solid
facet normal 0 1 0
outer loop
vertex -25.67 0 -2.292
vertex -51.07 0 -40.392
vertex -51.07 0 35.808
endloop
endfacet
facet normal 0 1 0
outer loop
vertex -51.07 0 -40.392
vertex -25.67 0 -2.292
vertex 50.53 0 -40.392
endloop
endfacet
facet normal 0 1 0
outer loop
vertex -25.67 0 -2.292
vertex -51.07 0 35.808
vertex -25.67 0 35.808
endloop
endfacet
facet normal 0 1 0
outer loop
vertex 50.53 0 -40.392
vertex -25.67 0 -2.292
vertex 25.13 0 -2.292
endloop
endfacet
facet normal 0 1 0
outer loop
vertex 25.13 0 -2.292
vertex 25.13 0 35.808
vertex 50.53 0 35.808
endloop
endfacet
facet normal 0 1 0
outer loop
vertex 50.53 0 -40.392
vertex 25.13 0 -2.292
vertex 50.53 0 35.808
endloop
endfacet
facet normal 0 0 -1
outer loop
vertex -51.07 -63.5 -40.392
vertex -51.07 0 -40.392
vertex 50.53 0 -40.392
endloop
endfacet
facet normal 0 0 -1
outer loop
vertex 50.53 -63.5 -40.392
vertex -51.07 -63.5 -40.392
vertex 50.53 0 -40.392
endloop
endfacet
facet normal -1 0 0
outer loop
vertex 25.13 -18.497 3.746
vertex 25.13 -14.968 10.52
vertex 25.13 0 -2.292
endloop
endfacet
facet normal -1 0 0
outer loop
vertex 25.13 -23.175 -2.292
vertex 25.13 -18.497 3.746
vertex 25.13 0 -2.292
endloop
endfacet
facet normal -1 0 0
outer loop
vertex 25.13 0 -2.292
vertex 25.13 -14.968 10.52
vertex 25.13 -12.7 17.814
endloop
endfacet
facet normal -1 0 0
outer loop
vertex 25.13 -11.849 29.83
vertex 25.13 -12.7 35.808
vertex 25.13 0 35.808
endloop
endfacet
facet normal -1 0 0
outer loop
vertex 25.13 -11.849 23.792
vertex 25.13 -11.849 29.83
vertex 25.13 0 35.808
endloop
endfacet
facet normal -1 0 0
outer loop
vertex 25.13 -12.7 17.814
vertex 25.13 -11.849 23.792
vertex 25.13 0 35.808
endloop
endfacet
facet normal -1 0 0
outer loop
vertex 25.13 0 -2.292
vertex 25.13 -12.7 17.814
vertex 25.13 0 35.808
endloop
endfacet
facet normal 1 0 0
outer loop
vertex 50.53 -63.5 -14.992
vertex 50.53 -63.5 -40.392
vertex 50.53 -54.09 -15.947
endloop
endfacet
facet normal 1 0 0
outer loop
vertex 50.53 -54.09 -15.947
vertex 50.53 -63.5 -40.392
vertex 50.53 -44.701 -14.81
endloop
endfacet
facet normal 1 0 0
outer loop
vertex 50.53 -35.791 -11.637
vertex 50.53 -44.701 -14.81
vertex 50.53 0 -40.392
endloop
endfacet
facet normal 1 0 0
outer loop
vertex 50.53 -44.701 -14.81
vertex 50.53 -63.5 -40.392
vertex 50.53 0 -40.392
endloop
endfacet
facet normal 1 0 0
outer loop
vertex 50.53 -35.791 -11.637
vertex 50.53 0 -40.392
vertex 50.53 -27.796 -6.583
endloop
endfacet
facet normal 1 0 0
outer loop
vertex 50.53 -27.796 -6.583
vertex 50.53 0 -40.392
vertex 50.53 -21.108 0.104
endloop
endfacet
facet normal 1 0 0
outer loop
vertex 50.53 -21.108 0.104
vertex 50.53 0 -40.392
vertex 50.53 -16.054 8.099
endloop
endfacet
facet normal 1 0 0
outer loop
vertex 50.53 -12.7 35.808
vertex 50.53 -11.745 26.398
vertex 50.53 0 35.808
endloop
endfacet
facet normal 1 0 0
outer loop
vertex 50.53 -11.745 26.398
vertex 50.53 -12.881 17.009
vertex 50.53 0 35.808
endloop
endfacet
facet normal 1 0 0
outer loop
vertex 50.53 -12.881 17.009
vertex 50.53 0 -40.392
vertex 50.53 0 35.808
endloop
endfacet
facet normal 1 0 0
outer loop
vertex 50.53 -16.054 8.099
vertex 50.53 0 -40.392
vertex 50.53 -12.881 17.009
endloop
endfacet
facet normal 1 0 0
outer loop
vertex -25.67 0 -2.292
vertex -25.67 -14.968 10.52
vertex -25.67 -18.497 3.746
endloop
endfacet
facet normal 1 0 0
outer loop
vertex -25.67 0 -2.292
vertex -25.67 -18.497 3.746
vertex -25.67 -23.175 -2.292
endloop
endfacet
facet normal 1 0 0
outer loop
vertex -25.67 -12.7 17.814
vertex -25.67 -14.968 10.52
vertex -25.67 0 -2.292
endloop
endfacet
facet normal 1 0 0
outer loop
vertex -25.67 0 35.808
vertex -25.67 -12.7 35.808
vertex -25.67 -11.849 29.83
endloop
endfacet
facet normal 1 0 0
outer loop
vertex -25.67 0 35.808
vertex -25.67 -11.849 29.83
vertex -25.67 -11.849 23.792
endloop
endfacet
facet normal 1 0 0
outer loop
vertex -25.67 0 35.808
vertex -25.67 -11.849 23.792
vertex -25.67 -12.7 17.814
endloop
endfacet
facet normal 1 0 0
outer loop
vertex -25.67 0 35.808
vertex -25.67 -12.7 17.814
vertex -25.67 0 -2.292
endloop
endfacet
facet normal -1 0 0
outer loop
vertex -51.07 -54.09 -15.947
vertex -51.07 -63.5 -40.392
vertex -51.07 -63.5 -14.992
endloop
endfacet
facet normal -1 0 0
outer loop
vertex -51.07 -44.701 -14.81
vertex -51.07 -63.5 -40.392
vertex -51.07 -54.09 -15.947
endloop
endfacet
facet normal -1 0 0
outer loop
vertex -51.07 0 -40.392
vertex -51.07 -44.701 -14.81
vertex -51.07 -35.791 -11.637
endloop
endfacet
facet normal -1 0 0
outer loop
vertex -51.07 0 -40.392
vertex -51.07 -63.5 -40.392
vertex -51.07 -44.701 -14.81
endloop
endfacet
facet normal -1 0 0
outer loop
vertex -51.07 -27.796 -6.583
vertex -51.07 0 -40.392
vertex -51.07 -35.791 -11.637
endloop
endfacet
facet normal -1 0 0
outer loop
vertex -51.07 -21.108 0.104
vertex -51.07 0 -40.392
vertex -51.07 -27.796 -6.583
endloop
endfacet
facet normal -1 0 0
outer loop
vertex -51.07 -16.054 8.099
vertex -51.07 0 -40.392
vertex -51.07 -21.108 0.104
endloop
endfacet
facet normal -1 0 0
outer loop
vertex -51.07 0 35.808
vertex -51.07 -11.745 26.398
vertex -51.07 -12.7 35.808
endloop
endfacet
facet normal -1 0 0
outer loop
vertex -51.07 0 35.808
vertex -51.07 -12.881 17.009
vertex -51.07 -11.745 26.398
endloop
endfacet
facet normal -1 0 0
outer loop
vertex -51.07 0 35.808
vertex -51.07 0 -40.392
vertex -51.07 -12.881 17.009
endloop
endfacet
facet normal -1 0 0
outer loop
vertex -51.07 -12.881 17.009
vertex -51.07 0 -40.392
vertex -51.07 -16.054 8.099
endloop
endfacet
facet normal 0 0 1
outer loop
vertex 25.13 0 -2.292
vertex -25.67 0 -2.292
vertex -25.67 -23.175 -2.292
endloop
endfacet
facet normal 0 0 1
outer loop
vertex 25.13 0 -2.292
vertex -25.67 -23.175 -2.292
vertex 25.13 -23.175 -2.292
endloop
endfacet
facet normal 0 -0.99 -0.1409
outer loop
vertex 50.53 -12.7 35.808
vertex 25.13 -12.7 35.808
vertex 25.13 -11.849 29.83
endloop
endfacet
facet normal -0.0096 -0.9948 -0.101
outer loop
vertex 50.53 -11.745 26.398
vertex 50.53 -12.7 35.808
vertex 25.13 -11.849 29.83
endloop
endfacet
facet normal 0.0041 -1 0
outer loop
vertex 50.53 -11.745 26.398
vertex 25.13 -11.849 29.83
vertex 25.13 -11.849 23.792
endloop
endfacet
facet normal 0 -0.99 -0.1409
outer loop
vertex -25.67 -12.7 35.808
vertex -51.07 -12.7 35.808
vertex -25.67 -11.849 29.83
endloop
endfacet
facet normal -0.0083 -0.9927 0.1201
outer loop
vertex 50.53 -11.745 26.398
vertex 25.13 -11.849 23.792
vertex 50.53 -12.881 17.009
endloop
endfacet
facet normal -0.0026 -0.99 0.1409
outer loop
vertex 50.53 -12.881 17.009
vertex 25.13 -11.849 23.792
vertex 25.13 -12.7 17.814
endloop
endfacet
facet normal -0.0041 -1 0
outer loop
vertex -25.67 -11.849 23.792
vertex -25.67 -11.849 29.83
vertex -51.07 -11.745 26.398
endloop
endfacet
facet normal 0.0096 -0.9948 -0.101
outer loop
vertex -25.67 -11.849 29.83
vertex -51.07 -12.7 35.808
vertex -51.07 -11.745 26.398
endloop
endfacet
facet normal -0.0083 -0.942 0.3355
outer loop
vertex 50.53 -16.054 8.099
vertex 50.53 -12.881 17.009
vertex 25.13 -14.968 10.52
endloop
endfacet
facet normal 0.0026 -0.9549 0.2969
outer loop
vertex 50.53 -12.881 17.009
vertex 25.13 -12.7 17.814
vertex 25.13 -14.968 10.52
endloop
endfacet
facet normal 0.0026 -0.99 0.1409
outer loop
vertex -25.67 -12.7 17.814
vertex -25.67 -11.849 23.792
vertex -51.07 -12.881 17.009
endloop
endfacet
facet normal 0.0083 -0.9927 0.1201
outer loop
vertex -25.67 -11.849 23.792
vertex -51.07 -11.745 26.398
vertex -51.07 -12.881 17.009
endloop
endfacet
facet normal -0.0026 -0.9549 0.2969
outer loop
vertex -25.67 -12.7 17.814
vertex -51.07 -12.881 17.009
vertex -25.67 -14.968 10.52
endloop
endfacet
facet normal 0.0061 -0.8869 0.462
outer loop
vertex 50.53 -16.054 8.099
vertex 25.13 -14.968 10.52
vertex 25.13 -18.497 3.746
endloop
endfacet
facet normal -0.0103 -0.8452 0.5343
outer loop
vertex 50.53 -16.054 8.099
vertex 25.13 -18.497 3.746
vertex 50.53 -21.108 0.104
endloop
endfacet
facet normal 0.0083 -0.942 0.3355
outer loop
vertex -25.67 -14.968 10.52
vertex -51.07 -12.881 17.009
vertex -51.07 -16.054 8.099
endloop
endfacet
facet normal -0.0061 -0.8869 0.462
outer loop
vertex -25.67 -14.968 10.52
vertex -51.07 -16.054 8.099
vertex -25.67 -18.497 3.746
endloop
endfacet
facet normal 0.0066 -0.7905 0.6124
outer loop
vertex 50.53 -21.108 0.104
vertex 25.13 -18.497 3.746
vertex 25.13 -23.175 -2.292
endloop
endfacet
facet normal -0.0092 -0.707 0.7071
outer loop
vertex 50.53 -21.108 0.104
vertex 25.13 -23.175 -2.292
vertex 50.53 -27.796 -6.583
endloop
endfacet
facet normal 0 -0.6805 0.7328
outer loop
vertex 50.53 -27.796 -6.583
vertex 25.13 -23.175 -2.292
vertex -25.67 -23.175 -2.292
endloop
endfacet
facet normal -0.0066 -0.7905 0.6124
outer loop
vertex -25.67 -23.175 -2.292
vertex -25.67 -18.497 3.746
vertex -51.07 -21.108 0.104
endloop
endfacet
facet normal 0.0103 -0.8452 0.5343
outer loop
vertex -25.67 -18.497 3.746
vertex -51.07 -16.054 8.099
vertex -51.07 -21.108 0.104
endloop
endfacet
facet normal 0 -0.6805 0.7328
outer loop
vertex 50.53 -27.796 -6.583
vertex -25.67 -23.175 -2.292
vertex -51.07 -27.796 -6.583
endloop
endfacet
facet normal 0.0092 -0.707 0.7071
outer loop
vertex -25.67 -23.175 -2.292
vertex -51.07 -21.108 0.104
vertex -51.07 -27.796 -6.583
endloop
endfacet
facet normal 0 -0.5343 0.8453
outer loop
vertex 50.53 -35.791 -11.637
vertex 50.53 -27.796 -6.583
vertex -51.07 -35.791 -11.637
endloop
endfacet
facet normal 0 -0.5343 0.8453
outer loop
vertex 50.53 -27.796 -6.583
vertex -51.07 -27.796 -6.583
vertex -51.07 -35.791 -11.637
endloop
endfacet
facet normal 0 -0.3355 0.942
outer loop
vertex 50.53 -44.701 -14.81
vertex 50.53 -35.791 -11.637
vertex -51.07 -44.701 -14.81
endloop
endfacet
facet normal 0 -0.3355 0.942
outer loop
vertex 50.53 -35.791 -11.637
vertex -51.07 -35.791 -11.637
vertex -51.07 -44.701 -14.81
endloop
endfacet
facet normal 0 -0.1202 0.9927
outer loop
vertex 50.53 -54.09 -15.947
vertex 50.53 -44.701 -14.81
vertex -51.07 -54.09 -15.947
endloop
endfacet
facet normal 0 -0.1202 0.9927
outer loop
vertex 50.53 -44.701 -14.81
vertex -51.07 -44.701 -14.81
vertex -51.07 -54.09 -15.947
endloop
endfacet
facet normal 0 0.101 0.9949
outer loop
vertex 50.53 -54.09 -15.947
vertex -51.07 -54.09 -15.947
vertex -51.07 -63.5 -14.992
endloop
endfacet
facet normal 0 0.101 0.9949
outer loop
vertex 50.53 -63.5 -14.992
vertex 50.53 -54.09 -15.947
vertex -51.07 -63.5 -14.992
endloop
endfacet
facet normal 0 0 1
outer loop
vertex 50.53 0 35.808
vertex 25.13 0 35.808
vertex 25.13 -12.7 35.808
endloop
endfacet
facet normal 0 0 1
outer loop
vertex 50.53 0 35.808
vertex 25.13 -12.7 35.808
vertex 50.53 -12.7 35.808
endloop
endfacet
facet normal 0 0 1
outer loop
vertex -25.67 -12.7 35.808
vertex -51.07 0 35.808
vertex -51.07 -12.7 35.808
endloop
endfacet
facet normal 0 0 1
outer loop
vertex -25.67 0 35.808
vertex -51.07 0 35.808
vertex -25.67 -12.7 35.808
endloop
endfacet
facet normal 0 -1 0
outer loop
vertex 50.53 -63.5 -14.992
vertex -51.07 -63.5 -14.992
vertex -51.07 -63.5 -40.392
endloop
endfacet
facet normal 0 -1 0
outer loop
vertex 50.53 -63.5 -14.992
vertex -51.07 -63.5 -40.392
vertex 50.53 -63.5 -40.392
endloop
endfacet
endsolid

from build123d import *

# Parameters (mm, degrees)
F0_W      = 101.6
F0_H      = 76.2
F1_DEPTH  = 63.5
F3_DEPTH  = 101.6
F4_W      = 50.8
F4_H      = 12.7
F5_DEPTH  = 38.1
F5_FACE_W = 50.8
F5_FACE_H = 20.105892
F6_DEPTH  = 25.4


with BuildPart() as f1:
    # F0 (on Front) → F1 (new body)
    with BuildSketch(Plane.XZ):
        with Locations((-0.270213, -2.291896)):
            Rectangle(F0_W, F0_H)
    extrude(amount=F1_DEPTH)

    # F2 (on face) → F3 (cut)
    with BuildSketch(Plane(origin=(-51.070213, 0, 0), x_dir=(0, -1, 0), z_dir=(-1, 0, 0))):
        with BuildLine():
            Line((63.5, 35.808104), (12.7, 35.808104))
            ThreePointArc((12.7, 35.808104), (24.26693, -3.424965), (63.5, -14.991896))
            Line((63.5, -14.991896), (63.5, 35.808104))
        make_face()
    extrude(amount=-F3_DEPTH, mode=Mode.SUBTRACT)

    # F4 (on face) → F5 (cut)
    with BuildSketch(Plane.XY.offset(35.808104)):
        with Locations((-0.270213, -6.35)):
            Rectangle(F4_W, F4_H)
    extrude(amount=-F5_DEPTH, mode=Mode.SUBTRACT)

    # F5_face (on face) → F6 (cut)
    with BuildSketch(Plane(origin=(-0.270213, -12.7, 7.76105), x_dir=(-1, 0, 0), z_dir=(0, 1, 0))):
        Rectangle(F5_FACE_W, F5_FACE_H)
    extrude(amount=-F6_DEPTH, mode=Mode.SUBTRACT)


solid = f1.part
